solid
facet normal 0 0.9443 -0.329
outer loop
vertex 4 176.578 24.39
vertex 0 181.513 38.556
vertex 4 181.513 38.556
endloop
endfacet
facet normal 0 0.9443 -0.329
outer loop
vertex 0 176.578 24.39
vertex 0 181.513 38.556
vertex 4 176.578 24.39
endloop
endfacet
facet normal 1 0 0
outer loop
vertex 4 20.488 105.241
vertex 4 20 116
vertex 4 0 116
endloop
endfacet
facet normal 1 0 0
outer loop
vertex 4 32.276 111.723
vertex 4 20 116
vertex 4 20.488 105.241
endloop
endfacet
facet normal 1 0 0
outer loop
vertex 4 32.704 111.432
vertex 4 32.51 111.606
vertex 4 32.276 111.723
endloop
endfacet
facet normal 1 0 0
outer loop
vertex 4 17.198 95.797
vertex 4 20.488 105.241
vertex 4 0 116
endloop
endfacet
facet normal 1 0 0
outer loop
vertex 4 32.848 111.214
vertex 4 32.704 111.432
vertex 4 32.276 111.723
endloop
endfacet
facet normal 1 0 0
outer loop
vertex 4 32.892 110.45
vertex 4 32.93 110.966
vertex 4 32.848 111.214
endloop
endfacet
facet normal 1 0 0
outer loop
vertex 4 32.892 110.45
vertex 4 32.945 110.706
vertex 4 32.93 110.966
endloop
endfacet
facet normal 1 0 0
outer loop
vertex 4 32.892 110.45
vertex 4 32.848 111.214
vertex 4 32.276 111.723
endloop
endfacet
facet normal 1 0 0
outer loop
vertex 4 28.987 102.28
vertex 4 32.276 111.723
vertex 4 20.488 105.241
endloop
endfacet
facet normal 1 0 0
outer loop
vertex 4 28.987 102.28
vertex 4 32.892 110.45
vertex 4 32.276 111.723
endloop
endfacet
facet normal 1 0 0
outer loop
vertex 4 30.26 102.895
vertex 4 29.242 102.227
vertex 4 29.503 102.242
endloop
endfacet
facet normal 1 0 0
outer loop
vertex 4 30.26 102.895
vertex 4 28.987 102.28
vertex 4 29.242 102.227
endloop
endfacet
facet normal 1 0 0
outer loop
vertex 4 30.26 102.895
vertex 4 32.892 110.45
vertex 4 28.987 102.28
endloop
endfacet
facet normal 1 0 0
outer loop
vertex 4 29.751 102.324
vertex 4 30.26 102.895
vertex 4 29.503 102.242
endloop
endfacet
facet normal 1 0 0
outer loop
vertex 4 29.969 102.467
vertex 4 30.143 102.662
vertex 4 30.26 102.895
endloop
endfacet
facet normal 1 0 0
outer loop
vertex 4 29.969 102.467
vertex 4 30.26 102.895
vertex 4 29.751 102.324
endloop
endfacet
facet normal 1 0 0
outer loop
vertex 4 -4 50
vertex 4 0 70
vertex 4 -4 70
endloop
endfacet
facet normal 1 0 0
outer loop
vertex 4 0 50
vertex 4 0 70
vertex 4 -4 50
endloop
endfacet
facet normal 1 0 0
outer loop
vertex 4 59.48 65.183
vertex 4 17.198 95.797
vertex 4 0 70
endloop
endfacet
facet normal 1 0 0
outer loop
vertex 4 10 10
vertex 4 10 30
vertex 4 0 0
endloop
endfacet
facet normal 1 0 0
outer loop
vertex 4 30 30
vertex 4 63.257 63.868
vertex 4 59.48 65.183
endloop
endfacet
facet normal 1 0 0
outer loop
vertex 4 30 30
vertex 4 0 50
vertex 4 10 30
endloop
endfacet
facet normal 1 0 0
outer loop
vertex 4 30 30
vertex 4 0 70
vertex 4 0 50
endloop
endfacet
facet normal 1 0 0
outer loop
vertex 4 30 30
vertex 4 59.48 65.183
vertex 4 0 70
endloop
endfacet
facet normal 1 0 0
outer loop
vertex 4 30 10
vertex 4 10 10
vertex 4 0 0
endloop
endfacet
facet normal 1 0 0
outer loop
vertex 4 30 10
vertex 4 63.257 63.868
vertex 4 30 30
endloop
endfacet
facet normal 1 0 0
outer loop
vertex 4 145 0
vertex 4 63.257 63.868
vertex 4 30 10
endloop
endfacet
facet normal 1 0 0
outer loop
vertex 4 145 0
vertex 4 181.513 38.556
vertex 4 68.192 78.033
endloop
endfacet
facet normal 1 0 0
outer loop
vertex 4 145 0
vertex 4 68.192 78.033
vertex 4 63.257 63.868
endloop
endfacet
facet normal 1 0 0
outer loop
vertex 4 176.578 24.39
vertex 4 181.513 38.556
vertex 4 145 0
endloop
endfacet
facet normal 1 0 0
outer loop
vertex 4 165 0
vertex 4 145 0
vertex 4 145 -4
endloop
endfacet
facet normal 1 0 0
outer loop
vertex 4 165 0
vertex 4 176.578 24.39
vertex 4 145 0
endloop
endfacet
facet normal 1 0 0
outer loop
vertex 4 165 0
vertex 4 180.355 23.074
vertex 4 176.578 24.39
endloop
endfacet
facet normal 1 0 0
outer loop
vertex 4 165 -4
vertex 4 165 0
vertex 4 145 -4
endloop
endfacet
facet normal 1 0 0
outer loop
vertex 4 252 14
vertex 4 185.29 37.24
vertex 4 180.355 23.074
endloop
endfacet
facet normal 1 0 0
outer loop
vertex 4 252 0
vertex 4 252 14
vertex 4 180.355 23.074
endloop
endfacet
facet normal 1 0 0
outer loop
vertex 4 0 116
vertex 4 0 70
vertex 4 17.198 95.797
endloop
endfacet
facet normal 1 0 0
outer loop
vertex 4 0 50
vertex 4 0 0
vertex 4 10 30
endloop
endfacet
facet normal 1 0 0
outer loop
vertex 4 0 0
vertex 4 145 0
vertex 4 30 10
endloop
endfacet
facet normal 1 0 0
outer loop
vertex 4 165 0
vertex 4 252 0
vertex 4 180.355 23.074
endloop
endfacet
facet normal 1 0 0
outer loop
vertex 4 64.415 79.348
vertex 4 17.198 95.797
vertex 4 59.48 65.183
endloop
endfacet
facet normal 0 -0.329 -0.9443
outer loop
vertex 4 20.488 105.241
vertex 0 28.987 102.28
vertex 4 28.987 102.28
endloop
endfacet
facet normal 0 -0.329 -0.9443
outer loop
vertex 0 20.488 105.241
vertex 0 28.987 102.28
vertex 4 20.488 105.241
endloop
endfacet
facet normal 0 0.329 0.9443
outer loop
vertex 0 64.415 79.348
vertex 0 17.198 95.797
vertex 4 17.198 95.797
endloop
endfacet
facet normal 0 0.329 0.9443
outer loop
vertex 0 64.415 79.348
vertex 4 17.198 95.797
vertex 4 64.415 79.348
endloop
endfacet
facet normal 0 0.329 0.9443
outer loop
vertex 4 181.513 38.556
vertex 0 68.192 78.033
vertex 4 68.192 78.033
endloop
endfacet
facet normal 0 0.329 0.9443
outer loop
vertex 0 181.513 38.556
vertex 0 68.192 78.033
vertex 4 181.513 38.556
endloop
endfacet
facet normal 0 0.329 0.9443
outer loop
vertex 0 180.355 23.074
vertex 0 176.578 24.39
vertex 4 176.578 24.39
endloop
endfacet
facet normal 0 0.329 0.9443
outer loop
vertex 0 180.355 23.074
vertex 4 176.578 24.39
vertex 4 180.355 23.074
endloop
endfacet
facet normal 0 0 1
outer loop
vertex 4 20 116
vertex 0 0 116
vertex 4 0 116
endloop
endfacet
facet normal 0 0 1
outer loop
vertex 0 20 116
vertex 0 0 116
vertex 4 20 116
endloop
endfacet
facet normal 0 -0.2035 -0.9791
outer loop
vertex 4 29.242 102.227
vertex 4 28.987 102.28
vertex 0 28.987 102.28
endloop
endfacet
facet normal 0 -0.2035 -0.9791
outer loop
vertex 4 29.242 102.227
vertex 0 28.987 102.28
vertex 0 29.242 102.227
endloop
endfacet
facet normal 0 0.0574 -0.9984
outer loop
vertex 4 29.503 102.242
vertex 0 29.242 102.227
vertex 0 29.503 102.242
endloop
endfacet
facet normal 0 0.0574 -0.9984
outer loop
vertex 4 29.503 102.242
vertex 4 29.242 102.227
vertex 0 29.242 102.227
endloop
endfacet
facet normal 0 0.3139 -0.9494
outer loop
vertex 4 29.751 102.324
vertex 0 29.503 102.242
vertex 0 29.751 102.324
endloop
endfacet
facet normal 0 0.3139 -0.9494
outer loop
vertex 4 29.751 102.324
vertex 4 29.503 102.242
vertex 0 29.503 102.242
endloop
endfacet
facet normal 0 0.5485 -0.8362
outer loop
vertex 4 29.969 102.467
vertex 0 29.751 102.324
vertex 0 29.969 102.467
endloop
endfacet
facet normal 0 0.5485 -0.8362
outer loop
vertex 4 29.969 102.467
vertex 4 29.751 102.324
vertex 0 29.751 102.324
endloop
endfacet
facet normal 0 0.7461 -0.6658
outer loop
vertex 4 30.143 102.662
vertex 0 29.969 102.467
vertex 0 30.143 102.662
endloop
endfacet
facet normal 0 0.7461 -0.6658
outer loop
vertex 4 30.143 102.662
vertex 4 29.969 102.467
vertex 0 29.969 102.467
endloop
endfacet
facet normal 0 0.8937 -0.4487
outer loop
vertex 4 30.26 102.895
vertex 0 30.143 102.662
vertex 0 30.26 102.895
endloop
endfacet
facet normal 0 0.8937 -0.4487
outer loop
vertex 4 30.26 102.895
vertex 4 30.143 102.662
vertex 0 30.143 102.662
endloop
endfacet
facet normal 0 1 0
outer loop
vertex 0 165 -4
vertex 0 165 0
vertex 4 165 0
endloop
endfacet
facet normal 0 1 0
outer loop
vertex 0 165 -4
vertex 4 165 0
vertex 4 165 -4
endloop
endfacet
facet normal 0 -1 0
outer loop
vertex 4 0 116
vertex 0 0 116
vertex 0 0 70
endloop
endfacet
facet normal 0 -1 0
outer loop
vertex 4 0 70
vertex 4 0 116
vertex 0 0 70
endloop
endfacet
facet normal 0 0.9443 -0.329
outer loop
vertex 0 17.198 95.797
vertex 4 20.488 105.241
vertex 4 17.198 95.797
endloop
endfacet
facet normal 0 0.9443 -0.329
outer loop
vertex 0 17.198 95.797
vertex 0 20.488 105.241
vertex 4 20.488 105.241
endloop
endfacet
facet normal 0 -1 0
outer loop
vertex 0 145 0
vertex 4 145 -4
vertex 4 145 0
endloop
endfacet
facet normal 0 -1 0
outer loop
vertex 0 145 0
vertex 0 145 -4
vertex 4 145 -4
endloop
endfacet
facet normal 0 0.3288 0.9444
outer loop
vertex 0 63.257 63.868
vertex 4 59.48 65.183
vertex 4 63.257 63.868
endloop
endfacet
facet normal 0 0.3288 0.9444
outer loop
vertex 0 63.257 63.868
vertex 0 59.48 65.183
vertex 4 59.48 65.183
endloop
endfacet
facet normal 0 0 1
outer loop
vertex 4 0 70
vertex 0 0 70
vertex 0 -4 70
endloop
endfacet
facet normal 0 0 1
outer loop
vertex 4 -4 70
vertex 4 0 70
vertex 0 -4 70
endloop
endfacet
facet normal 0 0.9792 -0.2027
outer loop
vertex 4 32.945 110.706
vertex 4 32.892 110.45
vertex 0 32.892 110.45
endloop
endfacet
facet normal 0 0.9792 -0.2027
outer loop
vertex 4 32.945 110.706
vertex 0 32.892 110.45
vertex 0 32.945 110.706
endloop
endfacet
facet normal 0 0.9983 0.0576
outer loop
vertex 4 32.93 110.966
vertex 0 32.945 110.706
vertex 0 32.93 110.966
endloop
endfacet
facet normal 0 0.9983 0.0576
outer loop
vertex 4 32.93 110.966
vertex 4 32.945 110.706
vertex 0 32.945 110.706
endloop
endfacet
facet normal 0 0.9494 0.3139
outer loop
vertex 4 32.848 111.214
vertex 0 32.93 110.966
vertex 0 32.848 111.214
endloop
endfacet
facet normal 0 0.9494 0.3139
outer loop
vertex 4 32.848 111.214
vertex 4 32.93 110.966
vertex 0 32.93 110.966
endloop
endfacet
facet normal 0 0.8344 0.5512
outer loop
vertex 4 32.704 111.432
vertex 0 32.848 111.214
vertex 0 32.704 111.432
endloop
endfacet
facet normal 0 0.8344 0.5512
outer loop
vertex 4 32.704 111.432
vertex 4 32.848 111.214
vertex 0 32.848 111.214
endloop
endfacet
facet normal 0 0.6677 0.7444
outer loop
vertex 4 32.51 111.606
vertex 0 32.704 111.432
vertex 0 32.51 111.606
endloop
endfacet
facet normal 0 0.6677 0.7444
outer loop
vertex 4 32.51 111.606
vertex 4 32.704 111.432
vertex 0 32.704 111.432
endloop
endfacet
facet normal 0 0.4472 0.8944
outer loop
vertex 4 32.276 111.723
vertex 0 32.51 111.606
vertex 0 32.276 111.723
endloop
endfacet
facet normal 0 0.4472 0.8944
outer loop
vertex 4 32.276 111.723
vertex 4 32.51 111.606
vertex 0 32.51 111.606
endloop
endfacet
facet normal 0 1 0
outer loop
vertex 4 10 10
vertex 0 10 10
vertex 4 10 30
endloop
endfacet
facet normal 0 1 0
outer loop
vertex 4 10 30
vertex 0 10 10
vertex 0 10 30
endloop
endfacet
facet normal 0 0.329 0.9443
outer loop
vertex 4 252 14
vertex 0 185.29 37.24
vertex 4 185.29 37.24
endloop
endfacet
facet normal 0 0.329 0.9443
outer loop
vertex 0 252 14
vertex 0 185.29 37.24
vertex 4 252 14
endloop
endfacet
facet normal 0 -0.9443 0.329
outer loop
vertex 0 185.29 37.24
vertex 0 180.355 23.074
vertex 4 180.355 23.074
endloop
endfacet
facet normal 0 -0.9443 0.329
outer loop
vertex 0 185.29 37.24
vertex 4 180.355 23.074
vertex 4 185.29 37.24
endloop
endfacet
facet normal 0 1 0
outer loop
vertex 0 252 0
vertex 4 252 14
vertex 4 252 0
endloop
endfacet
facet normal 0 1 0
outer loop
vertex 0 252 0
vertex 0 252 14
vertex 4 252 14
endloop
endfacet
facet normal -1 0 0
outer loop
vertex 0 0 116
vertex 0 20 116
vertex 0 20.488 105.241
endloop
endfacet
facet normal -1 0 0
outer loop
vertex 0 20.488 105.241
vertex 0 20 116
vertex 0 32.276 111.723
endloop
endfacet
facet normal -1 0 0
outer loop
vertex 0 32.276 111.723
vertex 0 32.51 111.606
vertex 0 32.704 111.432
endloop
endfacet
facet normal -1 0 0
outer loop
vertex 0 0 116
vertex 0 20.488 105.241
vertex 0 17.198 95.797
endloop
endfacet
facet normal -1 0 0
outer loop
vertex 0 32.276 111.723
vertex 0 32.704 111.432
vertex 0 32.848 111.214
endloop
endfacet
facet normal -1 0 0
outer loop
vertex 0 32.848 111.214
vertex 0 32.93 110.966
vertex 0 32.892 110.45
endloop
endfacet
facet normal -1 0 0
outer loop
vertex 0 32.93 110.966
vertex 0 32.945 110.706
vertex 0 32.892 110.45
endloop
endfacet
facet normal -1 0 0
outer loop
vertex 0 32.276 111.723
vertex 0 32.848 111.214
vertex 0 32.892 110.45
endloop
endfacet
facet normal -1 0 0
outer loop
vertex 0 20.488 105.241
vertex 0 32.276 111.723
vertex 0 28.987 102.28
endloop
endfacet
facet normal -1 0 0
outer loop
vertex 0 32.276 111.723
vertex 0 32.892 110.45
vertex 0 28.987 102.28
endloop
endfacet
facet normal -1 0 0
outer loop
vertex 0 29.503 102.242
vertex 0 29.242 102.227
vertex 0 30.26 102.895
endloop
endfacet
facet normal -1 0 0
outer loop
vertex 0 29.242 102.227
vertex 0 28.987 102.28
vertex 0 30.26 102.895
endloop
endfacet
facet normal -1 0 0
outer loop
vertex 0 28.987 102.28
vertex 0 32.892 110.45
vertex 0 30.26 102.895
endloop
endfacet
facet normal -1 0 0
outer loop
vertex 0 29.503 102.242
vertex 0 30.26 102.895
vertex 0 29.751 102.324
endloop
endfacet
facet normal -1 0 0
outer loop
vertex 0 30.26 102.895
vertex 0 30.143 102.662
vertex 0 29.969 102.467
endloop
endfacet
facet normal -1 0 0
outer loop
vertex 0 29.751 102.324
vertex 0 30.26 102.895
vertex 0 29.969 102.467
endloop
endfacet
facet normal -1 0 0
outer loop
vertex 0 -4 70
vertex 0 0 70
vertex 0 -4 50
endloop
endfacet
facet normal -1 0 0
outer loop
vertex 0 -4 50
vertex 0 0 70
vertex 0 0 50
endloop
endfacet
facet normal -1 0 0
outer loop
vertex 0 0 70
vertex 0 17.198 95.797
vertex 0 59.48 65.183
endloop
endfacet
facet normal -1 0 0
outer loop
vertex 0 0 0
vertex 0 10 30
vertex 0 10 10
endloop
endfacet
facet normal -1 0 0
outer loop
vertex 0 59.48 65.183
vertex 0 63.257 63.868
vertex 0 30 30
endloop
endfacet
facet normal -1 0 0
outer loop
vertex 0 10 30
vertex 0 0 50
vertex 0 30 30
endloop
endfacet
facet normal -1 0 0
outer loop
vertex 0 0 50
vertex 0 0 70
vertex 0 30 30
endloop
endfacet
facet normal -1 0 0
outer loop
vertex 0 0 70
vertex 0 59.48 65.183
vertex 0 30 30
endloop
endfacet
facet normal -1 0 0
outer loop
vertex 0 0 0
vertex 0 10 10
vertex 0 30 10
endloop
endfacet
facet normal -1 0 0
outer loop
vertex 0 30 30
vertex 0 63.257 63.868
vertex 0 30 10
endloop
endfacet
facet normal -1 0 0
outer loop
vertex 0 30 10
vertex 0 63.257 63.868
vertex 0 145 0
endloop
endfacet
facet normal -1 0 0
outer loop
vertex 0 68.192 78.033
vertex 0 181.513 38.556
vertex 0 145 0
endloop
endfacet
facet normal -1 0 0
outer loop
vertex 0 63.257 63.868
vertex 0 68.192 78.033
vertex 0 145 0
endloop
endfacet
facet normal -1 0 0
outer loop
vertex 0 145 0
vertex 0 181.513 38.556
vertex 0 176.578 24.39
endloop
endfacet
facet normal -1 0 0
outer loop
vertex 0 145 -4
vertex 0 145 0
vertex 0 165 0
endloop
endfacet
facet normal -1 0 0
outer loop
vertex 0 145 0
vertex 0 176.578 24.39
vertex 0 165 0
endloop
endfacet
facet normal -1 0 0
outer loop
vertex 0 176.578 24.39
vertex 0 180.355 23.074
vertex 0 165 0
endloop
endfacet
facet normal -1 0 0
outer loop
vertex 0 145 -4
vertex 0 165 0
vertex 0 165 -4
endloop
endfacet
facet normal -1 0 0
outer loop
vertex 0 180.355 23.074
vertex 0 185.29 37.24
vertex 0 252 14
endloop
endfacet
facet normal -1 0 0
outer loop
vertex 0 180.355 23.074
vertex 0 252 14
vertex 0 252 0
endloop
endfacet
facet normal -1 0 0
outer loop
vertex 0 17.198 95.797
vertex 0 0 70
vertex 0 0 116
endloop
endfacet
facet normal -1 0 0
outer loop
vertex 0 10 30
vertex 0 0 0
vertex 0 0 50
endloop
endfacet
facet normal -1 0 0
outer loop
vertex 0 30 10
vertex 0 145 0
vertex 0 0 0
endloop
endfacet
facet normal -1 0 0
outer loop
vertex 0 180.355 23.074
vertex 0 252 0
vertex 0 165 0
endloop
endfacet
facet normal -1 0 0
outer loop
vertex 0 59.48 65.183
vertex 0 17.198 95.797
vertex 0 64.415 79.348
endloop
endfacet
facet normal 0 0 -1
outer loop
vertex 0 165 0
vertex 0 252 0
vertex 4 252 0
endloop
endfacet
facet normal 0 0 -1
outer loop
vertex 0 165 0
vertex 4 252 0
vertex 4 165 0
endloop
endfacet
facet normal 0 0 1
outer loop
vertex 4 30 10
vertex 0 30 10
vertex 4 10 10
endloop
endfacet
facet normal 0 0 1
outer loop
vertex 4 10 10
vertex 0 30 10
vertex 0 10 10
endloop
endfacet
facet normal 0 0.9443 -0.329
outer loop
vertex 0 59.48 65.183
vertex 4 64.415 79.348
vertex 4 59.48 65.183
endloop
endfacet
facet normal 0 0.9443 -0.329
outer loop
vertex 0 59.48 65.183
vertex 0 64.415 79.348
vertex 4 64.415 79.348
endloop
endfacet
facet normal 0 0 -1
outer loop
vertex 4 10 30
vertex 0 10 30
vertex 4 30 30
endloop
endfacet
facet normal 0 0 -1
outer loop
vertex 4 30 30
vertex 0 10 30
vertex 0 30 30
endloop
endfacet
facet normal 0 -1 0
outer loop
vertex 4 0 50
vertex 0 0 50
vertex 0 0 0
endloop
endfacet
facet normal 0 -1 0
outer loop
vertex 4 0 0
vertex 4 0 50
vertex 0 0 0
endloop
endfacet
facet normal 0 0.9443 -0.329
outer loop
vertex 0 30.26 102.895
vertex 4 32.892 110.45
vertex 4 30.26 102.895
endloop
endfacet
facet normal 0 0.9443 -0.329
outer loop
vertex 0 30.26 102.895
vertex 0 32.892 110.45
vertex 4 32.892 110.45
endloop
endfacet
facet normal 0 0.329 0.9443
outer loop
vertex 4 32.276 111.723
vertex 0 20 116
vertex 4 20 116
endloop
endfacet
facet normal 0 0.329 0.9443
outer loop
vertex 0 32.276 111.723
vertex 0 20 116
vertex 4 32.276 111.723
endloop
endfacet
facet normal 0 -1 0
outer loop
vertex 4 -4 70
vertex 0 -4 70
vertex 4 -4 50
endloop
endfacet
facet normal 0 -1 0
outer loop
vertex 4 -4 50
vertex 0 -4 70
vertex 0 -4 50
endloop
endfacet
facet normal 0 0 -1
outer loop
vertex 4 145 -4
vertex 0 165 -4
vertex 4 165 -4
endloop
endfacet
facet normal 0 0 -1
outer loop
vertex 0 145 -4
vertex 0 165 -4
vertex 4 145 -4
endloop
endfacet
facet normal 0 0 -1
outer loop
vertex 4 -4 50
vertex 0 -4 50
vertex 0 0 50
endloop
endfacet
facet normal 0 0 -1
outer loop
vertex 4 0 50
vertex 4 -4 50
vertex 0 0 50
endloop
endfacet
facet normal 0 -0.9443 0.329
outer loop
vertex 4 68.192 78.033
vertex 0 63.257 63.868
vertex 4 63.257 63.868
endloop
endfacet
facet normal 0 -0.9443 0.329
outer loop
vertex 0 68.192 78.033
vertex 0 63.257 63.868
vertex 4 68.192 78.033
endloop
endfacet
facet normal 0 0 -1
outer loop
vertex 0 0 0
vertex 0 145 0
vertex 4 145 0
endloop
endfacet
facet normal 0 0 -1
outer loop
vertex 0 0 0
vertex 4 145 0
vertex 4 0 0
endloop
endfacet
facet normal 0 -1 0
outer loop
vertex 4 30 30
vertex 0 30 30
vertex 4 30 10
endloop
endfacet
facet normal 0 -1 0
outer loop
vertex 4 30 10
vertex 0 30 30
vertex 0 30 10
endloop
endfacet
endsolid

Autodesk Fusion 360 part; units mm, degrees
sketch "スケッチ1" plane through (0, 0, 0) normal (1, 0, 0) x (0, 0, -1)
  line L0 (-116, 0) -> (-116, 20)
  line L1 (-116, 20) -> (-111.3943, 33.2207)
  line L2 (-111.3943, 33.2207) -> (-101.951, 29.931)
  line L3 (-101.951, 29.931) -> (-105.2407, 20.4876)
  line L4 (-105.2407, 20.4876) -> (-95.7973, 17.1978)
  line L5 (-14, 252) -> (0, 252)
  line L6 (-95.7973, 17.1978) -> (-79.3485, 64.4147)
  line L7 (-79.3485, 64.4147) -> (-65.1834, 59.4801)
  line L8 (-65.1834, 59.4801) -> (-63.8675, 63.2574)
  line L9 (-63.8675, 63.2574) -> (-78.0326, 68.1921)
  line L10 (-78.0326, 68.1921) -> (-38.5555, 181.5127)
  line L11 (-38.5555, 181.5127) -> (-24.3904, 176.578)
  line L12 (-24.3904, 176.578) -> (-23.0745, 180.3554)
  line L13 (-23.0745, 180.3554) -> (-37.2396, 185.29)
  line L14 (-37.2396, 185.29) -> (-14, 252)
  line L15 (-116, 0) -> (-70, 0)
  line L16 (-70, 0) -> (-70, -4)
  line L17 (-70, -4) -> (-50, -4)
  line L18 (-50, -4) -> (-50, 0)
  line L19 (-50, 0) -> (0, 0)
  line L20 (0, 252) -> (0, 165)
  line L21 (0, 165) -> (4, 165)
  line L22 (4, 165) -> (4, 145)
  line L23 (4, 145) -> (0, 145)
  line L24 (0, 145) -> (0, 0)
  line L25 (4, 155) -> (-13.5, 155)
  line L26 (-60, -4) -> (-60, 13.5)
  line L27 (-64.1481, 77.6509) -> (-33.5533, 165.4743)
  line L28 (-10, 10) -> (-30, 10)
  line L29 (-30, 10) -> (-30, 30)
  line L30 (-30, 30) -> (-10, 30)
  line L31 (-10, 30) -> (-10, 10)
  dimension "d1" = 116
  dimension "d2" = 20
  dimension "d3" = 14
  dimension "d4" = 10
  dimension "d5" = 10
  dimension "d6" = 10
  dimension "d9" = 14
  dimension "d11" = 252
  dimension "d12" = 248.642
  dimension "d13" = 4
  dimension "d14" = 4
  dimension "d15" = 120
  dimension "d16" = 50
  dimension "d17" = 15
  dimension "d18" = 20
  dimension "d19" = 4
  dimension "d20" = 50
  dimension "d21" = 4
  dimension "d22" = 20
  dimension "d23" = 145
  dimension "d24" = 17.5
  dimension "d25" = 17.5
  dimension "d31" = 10
  dimension "d32" = 13.5
  dimension "d33" = 13.5
  dimension "d36" = 10
  dimension "d37" = 20
  dimension "d38" = 20
  dimension "d39" = 10
extrude "押し出し1" add sketch "スケッチ1" along normal blind 4
hole "穴1" at (0, 0, 0) at (0, 13.5, 60) at (0, 0, 0) at (0, 165.4743, 33.5533) direction (-1, 0, 0) diameter 3.2 end through all
fillet "フィレット1" radius 1 2 edges at (2, 29.931, 101.951) (2, 33.2207, 111.3943)
